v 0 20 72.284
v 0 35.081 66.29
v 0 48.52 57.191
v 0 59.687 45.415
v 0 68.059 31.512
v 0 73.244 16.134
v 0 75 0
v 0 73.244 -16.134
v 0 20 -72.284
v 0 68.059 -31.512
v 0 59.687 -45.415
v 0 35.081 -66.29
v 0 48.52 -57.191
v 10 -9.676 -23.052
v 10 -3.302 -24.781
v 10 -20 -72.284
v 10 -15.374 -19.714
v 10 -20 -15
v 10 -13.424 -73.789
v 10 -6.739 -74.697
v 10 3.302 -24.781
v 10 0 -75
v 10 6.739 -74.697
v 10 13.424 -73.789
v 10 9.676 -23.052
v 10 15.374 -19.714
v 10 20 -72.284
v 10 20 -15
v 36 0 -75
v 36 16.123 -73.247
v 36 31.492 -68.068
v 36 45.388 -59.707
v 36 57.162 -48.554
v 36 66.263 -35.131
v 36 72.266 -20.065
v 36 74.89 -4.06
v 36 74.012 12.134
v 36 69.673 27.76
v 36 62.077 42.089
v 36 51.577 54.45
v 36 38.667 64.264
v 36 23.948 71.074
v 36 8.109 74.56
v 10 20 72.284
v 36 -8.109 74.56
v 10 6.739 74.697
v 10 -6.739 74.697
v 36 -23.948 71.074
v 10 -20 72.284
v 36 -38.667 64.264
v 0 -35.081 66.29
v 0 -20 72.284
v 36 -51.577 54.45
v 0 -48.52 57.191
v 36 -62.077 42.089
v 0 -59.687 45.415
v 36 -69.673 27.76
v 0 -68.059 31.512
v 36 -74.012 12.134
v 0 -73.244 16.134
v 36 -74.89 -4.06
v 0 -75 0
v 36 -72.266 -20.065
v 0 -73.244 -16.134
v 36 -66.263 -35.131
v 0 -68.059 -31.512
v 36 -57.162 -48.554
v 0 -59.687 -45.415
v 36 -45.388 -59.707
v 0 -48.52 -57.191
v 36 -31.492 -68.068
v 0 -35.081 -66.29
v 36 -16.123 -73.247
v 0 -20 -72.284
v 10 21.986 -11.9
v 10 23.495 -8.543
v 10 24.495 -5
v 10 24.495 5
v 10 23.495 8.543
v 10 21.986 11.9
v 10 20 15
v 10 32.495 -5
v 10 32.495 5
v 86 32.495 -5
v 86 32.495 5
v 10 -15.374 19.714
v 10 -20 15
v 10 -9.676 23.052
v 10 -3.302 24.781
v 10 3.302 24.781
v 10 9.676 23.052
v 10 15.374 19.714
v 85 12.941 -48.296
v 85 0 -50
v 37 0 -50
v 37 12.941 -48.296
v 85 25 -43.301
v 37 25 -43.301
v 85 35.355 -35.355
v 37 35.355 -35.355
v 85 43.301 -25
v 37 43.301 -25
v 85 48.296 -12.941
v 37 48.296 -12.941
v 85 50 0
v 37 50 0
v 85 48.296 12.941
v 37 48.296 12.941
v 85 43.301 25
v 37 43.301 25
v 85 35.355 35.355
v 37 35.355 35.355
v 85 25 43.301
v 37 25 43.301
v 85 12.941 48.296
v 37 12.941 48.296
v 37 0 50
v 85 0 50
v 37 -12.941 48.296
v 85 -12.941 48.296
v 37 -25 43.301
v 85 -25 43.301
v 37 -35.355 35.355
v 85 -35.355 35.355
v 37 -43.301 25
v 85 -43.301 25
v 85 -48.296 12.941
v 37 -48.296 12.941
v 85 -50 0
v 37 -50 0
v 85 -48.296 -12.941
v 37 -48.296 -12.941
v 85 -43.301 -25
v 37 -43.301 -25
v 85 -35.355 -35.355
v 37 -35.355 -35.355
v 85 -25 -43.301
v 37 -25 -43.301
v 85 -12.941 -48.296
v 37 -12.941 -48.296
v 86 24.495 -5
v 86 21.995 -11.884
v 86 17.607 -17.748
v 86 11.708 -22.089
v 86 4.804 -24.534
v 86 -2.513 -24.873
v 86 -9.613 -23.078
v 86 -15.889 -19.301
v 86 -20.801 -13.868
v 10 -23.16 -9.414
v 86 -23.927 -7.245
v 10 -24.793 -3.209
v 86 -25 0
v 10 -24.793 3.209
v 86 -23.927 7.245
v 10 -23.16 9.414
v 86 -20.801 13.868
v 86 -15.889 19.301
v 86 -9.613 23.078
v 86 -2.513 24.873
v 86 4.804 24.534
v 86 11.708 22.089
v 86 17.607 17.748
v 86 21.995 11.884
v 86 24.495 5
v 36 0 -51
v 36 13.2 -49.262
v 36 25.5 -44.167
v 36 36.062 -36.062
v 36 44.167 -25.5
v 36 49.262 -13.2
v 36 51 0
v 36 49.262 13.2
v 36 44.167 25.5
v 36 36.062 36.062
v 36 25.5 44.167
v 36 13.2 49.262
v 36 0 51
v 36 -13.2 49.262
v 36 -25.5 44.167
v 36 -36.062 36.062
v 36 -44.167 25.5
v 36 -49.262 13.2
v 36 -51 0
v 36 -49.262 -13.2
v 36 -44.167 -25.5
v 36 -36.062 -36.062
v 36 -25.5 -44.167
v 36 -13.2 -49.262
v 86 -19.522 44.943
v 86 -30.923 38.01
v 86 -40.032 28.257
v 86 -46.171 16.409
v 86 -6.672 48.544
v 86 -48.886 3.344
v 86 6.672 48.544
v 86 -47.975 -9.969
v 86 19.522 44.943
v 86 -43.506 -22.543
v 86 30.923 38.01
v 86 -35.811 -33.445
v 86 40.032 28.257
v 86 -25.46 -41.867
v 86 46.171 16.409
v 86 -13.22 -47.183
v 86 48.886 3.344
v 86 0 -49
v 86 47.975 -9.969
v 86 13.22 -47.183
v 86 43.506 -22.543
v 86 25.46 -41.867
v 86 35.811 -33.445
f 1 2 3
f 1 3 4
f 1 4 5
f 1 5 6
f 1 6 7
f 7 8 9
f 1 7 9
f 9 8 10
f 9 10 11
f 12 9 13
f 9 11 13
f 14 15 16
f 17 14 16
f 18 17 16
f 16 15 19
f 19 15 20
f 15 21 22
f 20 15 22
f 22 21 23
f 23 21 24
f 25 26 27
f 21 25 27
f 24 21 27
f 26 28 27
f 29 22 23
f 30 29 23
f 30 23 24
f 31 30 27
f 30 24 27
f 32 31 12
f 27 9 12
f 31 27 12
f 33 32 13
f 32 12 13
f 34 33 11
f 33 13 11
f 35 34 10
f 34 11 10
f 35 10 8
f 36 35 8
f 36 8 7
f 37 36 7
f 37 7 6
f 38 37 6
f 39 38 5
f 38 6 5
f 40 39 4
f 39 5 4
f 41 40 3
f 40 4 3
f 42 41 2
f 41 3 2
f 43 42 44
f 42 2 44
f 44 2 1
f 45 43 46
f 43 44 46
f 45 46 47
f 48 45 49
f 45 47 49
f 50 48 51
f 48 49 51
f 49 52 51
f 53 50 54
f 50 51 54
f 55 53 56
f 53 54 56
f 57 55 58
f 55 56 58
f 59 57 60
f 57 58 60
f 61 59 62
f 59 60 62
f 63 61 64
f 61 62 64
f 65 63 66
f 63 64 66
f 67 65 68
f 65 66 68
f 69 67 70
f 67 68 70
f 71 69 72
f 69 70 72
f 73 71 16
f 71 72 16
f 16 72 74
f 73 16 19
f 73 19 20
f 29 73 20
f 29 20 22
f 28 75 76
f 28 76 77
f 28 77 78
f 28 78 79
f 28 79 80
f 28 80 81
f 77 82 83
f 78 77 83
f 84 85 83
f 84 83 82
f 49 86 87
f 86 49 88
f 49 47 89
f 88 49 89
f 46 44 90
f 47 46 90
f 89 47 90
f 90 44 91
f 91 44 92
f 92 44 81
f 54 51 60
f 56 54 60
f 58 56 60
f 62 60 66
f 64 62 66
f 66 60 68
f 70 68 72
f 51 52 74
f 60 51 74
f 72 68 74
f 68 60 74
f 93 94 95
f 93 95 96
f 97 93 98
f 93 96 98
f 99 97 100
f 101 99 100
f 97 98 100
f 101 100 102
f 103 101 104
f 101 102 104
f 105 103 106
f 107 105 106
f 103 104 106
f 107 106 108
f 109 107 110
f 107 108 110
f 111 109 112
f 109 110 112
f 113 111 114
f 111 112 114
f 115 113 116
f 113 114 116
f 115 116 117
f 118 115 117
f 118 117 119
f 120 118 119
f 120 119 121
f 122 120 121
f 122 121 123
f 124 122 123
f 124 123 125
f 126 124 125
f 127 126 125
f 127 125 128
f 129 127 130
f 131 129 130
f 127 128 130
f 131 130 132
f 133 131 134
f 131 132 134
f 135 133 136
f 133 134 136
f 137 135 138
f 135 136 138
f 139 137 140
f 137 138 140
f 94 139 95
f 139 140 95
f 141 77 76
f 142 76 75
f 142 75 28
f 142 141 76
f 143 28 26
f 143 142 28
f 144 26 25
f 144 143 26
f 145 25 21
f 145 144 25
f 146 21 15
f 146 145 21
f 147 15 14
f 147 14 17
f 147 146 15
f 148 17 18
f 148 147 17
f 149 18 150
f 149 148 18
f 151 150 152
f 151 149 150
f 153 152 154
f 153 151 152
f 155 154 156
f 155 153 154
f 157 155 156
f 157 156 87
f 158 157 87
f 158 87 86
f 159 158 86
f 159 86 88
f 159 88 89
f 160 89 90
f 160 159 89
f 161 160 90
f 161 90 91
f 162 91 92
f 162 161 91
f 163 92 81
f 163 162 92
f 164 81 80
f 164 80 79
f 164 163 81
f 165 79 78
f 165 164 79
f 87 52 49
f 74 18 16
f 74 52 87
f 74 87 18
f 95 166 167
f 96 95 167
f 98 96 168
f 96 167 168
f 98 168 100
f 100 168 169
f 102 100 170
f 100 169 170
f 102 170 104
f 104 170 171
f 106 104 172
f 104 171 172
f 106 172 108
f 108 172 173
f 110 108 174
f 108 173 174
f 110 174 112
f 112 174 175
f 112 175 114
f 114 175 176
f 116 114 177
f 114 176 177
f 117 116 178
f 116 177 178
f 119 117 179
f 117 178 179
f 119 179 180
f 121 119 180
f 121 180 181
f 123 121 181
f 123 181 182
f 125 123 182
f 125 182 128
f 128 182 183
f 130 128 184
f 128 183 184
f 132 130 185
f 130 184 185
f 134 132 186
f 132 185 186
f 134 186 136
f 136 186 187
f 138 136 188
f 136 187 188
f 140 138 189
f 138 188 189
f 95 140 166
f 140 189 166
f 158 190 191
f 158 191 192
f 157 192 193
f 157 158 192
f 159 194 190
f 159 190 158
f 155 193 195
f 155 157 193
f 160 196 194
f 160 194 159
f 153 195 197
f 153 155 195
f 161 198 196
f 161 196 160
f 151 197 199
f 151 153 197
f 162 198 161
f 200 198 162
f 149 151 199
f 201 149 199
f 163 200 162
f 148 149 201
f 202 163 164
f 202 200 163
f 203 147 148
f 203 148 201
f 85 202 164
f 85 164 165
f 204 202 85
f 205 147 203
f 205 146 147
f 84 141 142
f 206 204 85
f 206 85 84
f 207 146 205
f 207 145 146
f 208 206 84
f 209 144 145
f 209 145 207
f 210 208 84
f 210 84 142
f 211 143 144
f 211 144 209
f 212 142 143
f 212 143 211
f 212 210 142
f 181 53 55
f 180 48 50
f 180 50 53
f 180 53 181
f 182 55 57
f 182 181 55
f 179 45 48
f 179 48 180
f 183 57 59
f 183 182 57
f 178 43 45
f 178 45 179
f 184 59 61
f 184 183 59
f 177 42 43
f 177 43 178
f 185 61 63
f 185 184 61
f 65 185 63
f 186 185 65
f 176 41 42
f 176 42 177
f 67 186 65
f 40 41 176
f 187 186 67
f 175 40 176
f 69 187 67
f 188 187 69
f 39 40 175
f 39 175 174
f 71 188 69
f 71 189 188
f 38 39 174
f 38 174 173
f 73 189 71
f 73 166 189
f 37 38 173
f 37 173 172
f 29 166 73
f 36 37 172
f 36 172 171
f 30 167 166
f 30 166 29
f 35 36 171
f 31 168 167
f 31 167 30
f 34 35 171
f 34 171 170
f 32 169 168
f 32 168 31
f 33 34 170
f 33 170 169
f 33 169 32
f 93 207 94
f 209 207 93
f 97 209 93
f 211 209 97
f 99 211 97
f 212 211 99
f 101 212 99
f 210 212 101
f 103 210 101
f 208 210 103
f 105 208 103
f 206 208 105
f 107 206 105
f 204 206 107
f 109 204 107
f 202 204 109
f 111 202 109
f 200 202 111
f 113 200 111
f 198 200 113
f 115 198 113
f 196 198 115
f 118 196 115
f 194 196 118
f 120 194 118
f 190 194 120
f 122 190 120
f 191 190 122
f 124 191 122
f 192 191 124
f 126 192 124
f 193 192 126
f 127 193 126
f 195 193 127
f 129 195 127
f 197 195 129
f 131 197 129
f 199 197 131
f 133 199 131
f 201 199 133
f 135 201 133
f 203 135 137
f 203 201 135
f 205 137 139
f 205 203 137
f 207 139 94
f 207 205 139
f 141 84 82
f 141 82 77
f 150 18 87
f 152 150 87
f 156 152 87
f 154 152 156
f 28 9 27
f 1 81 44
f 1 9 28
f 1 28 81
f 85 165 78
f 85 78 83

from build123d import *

# Parameters (mm, degrees)
SKETCH1_R           = 75
BOSS_EXTRUDE1_DEPTH = 36
SKETCH2_R           = 50
BOSS_EXTRUDE2_DEPTH = 50
CUT_EXTRUDE2_DEPTH  = 10
CUT_EXTRUDE3_DEPTH  = 76
CHAMFER1_SIZE       = 1
CHAMFER2_SIZE       = 1


with BuildPart() as part:
    # Sketch1 → Boss-Extrude1 (new body)
    with BuildSketch(Plane(origin=(0, 0, 0), x_dir=(0, 0, -1), z_dir=(1, 0, 0))):
        Circle(SKETCH1_R)
    extrude(amount=BOSS_EXTRUDE1_DEPTH)

    # Sketch2 → Boss-Extrude2 (add)
    with BuildSketch(Plane(origin=(36, 0, 0), x_dir=(0, 0, -1), z_dir=(1, 0, 0))):
        Circle(SKETCH2_R)
    extrude(amount=BOSS_EXTRUDE2_DEPTH)

    # Sketch4 → Cut-Extrude2 (cut)
    with BuildSketch(Plane.ZY):
        with BuildLine():
            Line((-72.284161474, 20), (72.284161474, 20))
            ThreePointArc((72.284161474, 20), (75, 0), (72.284161474, -20))
            Line((72.284161474, -20), (-72.284161474, -20))
            ThreePointArc((-72.284161474, -20), (-75, 0), (-72.284161474, 20))
        make_face()
    extrude(amount=-CUT_EXTRUDE2_DEPTH, mode=Mode.SUBTRACT)

    # Sketch5 → Cut-Extrude3 (cut)
    with BuildSketch(Plane(origin=(86, 0, 0), x_dir=(0, 0, -1), z_dir=(1, 0, 0))):
        with BuildLine():
            Line((-5, 32.494897428), (5, 32.494897428))
            Line((5, 32.494897428), (5, 24.494897428))
            ThreePointArc((5, 24.494897428), (0, -25), (-5, 24.494897428))
            Line((-5, 24.494897428), (-5, 32.494897428))
        make_face()
    extrude(amount=-CUT_EXTRUDE3_DEPTH, mode=Mode.SUBTRACT)

    # Chamfer1
    chamfer1_edges = [part.edges().sort_by_distance(p)[0] for p in [
        (86, 0, 50),
    ]]
    chamfer(chamfer1_edges, length=CHAMFER1_SIZE)

    # Chamfer2
    chamfer2_edges = [part.edges().sort_by_distance(p)[0] for p in [
        (36, 0, 50),
    ]]
    chamfer(chamfer2_edges, length=CHAMFER2_SIZE)


solid = part.part
